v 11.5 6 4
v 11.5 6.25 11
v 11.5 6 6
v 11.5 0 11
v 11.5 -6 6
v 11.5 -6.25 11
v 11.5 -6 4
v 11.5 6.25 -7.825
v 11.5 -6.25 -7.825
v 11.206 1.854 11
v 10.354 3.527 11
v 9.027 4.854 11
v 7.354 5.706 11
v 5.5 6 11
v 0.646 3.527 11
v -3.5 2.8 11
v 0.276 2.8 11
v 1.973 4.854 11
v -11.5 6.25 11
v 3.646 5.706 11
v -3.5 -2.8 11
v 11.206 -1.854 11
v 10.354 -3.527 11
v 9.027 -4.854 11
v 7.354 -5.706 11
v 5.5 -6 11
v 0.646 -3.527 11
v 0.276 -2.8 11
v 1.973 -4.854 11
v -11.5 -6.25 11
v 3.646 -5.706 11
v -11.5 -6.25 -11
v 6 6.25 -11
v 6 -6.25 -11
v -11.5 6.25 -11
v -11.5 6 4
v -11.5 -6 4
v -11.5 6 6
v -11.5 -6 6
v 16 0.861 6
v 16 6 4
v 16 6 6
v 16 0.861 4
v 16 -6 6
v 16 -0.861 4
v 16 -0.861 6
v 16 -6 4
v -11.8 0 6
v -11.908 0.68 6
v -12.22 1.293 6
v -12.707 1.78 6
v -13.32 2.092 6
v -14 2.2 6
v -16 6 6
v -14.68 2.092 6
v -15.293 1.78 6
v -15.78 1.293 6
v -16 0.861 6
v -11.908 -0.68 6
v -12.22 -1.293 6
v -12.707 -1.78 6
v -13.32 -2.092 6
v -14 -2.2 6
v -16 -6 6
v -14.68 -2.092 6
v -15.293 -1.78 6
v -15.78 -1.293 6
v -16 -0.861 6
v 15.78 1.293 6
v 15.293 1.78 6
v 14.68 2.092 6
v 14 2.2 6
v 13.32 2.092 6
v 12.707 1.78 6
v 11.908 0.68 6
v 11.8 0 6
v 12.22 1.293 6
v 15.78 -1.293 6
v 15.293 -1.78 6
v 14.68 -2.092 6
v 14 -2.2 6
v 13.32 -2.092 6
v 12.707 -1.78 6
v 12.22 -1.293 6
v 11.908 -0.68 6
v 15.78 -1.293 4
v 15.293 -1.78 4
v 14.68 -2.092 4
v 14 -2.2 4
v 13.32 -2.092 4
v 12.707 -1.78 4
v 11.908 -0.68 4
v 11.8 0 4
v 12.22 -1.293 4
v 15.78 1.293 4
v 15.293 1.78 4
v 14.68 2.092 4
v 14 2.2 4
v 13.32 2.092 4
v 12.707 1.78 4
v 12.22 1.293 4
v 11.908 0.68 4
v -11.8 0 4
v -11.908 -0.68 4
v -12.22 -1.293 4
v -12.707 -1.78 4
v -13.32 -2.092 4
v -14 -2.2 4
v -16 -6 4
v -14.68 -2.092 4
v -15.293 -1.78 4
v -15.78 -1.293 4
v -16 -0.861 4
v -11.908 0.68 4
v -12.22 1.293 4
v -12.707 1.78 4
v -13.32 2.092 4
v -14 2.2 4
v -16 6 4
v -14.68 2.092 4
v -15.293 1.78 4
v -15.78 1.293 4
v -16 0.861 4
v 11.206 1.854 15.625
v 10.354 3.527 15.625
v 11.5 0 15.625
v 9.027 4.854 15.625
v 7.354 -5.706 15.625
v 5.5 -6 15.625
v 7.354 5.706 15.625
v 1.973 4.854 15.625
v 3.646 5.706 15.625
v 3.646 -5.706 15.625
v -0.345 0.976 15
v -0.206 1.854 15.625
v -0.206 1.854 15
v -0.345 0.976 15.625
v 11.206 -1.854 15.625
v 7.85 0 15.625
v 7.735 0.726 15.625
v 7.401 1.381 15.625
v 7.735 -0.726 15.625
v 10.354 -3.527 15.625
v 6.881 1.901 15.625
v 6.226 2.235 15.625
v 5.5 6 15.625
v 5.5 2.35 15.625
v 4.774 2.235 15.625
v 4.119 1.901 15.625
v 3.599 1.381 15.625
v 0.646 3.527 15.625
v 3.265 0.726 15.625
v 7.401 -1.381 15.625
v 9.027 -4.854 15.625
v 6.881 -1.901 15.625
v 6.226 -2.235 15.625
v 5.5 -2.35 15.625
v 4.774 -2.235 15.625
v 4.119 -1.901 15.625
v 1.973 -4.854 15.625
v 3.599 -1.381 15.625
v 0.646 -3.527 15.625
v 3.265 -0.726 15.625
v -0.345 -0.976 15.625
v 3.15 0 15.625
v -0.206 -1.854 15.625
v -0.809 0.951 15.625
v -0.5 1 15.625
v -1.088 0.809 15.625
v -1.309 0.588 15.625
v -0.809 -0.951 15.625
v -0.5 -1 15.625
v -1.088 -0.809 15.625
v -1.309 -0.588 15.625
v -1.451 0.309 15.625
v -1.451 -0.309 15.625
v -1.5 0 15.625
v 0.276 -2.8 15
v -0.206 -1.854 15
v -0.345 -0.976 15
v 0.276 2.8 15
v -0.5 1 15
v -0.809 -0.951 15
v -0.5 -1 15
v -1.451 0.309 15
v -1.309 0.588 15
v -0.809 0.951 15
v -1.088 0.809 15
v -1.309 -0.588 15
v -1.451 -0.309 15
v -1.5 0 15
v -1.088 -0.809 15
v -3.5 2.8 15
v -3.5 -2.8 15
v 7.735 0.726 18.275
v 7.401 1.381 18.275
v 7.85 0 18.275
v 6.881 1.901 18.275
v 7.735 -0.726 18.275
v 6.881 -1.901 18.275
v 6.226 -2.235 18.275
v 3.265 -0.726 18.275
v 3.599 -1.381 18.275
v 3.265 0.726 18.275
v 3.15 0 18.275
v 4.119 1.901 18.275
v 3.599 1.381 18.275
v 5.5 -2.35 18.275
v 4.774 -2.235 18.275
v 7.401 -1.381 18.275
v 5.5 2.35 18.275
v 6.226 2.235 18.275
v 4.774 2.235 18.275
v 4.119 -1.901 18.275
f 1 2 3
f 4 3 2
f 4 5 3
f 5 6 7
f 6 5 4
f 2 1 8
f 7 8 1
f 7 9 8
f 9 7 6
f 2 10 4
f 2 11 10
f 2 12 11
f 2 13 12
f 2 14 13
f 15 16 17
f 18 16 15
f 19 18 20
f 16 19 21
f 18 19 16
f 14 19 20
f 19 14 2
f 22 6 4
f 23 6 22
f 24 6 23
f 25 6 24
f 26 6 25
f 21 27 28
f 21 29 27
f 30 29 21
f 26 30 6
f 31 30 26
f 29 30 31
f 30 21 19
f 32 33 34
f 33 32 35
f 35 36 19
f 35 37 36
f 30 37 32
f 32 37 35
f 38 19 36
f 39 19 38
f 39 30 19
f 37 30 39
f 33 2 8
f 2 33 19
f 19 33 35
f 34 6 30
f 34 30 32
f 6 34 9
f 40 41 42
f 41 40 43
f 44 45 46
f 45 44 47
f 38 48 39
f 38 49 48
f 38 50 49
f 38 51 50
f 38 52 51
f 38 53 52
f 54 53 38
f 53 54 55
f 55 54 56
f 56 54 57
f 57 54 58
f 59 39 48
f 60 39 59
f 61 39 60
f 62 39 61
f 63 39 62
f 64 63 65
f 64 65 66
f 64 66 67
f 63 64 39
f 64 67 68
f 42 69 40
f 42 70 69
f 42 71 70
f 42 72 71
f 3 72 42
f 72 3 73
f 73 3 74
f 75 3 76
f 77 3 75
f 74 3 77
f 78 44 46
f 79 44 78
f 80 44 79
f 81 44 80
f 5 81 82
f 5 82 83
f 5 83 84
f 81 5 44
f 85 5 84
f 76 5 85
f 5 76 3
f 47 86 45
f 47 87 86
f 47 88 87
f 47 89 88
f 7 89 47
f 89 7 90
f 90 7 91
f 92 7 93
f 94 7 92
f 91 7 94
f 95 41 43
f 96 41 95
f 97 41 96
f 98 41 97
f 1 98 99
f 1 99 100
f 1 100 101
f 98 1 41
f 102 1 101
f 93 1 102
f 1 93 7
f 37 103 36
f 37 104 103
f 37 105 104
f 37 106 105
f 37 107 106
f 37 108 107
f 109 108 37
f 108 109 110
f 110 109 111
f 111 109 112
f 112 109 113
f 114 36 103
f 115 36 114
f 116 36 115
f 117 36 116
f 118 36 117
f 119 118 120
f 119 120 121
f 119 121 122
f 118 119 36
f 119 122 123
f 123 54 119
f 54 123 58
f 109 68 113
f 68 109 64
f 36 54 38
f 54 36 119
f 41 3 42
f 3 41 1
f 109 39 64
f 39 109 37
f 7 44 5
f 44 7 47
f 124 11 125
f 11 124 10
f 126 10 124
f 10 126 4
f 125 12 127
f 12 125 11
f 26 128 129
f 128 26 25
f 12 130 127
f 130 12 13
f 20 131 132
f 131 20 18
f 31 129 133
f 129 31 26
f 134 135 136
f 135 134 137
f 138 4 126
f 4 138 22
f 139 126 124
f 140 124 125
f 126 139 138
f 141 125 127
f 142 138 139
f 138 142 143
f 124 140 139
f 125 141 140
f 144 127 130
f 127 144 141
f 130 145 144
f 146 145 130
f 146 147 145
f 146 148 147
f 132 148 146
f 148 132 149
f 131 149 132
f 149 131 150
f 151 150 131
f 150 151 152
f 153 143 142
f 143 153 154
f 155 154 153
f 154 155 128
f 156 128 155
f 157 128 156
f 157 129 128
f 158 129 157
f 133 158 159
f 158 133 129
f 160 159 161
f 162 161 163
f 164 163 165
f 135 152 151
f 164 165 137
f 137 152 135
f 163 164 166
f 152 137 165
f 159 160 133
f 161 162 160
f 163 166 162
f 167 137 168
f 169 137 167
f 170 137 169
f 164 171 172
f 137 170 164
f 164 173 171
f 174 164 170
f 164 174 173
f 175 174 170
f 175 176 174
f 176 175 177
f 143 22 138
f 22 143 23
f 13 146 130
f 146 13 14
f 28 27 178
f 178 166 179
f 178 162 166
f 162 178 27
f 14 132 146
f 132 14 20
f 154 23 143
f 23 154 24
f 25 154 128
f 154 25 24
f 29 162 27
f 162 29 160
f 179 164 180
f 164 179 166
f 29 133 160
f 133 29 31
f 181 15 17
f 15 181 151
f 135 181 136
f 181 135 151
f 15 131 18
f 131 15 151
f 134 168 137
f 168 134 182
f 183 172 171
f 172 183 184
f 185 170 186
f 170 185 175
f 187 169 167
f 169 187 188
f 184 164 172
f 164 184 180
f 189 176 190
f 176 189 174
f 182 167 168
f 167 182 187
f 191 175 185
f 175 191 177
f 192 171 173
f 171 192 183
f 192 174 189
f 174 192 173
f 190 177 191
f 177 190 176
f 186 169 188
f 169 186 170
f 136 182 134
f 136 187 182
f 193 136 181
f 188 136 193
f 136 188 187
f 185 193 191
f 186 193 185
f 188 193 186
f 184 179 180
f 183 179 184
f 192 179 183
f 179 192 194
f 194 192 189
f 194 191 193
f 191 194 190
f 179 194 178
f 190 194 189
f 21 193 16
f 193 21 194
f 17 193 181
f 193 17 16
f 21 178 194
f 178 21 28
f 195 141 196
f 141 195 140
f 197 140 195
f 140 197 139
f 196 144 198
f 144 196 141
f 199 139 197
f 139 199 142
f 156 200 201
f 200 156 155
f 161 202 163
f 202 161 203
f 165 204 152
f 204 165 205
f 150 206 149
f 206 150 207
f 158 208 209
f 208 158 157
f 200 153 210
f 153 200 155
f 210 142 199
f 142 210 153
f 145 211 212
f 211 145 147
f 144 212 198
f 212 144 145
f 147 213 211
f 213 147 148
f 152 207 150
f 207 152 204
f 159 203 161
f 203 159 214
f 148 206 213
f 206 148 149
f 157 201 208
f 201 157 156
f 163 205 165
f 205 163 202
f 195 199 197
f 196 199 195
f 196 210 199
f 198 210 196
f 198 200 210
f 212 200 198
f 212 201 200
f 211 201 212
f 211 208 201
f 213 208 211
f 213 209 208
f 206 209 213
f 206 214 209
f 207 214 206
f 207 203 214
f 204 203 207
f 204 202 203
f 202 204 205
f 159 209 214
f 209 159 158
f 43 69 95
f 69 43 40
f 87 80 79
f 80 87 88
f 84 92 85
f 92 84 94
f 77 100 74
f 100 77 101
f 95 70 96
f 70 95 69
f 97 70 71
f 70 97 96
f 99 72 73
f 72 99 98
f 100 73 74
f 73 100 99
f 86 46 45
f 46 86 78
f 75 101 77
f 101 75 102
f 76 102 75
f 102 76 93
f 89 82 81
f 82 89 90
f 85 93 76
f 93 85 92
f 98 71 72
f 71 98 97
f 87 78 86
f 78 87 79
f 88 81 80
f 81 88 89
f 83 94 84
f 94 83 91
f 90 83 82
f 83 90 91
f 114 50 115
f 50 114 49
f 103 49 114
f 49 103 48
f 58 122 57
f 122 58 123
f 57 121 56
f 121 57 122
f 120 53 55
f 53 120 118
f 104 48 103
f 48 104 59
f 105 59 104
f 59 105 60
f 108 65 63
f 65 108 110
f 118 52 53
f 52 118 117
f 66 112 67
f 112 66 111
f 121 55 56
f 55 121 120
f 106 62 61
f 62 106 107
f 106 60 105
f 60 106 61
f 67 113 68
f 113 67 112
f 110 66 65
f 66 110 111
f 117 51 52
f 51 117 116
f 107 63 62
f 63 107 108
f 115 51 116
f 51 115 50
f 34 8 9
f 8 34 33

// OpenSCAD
9g_motor();

module 9g_motor(){
	difference(){			
		union(){
			color("steelblue") cube([23,12.5,22], center=true);
			color("steelblue") translate([0,0,5]) cube([32,12,2], center=true);
			color("steelblue") translate([5.5,0,2.75]) cylinder(r=6, h=25.75, $fn=20, center=true);
			color("steelblue") translate([-.5,0,2.75]) cylinder(r=1, h=25.75, $fn=20, center=true);
			color("steelblue") translate([-1,0,2.75]) cube([5,5.6,24.5], center=true);		
			color("white") translate([5.5,0,3.65]) cylinder(r=2.35, h=29.25, $fn=20, center=true);				
		}
		translate([10,0,-11]) rotate([0,-30,0]) cube([8,13,4], center=true);
		for ( hole = [14,-14] ){
			translate([hole,0,5]) cylinder(r=2.2, h=4, $fn=20, center=true);
		}	
	}
}
